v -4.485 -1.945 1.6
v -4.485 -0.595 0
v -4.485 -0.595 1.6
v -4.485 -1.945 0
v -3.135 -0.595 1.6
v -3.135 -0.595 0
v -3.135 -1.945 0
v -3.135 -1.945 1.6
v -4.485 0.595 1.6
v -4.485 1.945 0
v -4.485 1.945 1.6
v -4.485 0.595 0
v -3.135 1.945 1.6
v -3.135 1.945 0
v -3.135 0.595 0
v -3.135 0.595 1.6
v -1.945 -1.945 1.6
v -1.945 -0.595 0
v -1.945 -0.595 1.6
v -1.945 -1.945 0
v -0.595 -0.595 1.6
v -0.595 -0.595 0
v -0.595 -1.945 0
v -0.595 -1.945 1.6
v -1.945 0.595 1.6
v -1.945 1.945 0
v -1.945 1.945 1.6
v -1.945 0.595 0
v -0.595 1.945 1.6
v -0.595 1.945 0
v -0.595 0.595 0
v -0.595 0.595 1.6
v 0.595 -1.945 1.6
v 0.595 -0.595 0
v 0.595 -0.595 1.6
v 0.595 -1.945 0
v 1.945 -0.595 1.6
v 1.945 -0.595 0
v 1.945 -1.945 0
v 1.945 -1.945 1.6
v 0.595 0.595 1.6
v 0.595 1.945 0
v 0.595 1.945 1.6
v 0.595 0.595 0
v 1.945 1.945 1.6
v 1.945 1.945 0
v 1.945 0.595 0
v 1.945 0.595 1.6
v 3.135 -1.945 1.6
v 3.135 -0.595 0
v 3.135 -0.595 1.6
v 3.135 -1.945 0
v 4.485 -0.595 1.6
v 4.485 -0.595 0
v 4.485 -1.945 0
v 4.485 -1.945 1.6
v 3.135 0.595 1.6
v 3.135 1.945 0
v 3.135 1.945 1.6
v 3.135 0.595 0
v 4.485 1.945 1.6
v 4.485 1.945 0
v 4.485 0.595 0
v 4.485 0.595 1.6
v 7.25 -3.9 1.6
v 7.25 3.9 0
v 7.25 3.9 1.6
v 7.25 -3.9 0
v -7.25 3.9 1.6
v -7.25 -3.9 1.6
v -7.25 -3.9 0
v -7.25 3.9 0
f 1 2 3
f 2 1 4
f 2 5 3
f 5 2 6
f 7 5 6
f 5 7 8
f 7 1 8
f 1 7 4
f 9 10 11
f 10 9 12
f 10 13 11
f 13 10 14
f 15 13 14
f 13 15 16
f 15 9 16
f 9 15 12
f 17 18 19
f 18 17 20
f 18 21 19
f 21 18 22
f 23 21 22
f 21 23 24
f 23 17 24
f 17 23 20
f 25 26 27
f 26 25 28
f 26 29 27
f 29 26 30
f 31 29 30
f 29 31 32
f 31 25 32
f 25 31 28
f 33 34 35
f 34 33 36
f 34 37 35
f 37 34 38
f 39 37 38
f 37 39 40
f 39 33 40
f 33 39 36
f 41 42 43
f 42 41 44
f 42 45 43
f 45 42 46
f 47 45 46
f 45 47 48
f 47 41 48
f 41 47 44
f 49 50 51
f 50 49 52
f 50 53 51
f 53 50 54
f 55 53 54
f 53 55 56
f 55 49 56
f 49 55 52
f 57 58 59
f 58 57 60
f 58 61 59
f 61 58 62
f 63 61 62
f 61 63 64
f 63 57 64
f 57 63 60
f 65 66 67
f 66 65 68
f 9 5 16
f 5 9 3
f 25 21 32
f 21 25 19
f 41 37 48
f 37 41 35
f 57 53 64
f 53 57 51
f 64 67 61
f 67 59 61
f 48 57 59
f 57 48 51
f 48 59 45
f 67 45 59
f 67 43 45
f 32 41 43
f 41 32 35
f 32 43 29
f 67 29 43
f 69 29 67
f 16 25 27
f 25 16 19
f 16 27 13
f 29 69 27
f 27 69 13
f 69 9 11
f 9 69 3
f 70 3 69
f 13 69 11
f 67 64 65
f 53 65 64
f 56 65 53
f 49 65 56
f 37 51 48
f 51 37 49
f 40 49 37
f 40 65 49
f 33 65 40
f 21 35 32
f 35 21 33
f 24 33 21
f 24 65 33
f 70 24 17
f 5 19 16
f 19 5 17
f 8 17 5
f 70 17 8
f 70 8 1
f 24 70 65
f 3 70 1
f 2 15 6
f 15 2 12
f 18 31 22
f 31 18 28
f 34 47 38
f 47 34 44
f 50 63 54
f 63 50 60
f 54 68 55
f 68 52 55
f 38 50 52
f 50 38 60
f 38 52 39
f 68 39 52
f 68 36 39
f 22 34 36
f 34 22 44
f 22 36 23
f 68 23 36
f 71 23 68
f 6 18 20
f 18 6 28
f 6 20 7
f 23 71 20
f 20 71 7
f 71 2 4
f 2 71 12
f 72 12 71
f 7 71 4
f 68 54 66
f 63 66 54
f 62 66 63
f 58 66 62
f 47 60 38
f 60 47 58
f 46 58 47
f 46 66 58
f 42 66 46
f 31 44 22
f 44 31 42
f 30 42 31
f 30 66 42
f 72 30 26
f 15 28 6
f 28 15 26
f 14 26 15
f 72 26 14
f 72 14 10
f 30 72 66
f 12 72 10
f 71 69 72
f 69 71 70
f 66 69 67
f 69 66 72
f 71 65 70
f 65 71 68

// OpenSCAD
// BTS7960 / IBT-2 logic plug, v1 fit prototype (millimetres).
//
// v1: the complete driver-side nose is 1 mm narrower on each x side than v0,
// and fasteners are M3 bolts with external nuts. With an approximately 13 mm
// female-header body, the x-side walls are only about 0.55 mm: fit trial only.
// This is NOT keyed yet. Do not use with an energised motor.

$fn = 48;

part = "fit_gauge"; // [fit_gauge,lower,upper,assembly,exploded]

pitch = 2.54;
pin_hole = 1.35;         // confirmed by the first gauge fit on the driver
front_lip = 1.60;

header_x = 13.00;        // approximate complete 2x4 female-header body
header_y = 4.50;
header_z = 8.50;         // unmeasured; adjust after checking the female header
header_fit = 0.40;       // total clearance, not per side

nose_x = 14.50;          // v0 was 16.50: -1 mm at left and right, all along nose
nose_y = 7.80;
nose_z = front_lip + header_z + 1.00;

rear_x = 25.00;          // retained for adequate M3 flange wall thickness
rear_y = 15.00;
rear_z = 18.00;
rear_corner_r = 2.50;   // external x-z corners only; functional cuts unchanged
total_z = nose_z + rear_z;

solder_x = 12.00;        // smaller than v0, still wider than 7.62 mm pin span
solder_y = 9.20;
solder_depth = 13.00;
cable_exit_d = 5.50;

screw_x = 9.00;
screw_z = nose_z + 7.00;
screw_clearance_d = 3.20; // two M3 through-bolts, external nuts
mark_depth = 0.60;

epsilon = 0.02;

module eight_pin_pattern(h=1, aperture=pin_hole) {
    for (col = [0:3], row = [0:1])
        translate([(col - 1.5)*pitch, (row - 0.5)*pitch, -epsilon])
            linear_extrude(height=h + 2*epsilon)
                square([aperture, aperture], center=true);
}

module fit_gauge() {
    difference() {
        translate([-nose_x/2, -nose_y/2, 0])
            cube([nose_x, nose_y, front_lip]);
        eight_pin_pattern(front_lip);
    }
}

module outside_shell() {
    union() {
        translate([-nose_x/2, -nose_y/2, 0])
            cube([nose_x, nose_y, nose_z]);
        // Round the visible outline of the wide rear/upper housing. Cylinders
        // run along y, so screw axes, mating face and header cavity stay put.
        hull()
            for (x = [-rear_x/2 + rear_corner_r,
                       rear_x/2 - rear_corner_r],
                 z = [nose_z + rear_corner_r,
                      total_z - rear_corner_r])
                translate([x, 0, z])
                    rotate([-90, 0, 0])
                        cylinder(r=rear_corner_r, h=rear_y, center=true);
    }
}

module cable_bore() {
    translate([0, 0, nose_z + solder_depth - epsilon])
        cylinder(d=cable_exit_d, h=rear_z - solder_depth + 2*epsilon);
}

module fastener_holes() {
    for (x = [-screw_x, screw_x])
        translate([x, -rear_y/2 - epsilon, screw_z])
            rotate([-90, 0, 0])
                cylinder(d=screw_clearance_d, h=rear_y + 2*epsilon);
}

module orientation_mark() {
    // Recessed on the outside of the y-positive half. When wiring the plug,
    // this side must contain the VCC / R_IS / R_EN / RPWM socket row.
    translate([0, rear_y/2 + epsilon, nose_z + 3.10])
        rotate([90, 0, 0])
            linear_extrude(height=mark_depth + 2*epsilon)
                mirror([1, 0, 0])
                    text("VCC", size=3.80, halign="center", valign="center");
}

module whole_shell() {
    difference() {
        outside_shell();

        translate([-(header_x + header_fit)/2,
                   -(header_y + header_fit)/2,
                   front_lip])
            cube([header_x + header_fit,
                  header_y + header_fit,
                  header_z + 1.10]);

        // Insulated solder tails, five-wire harness and the EN bridge.
        translate([-solder_x/2, -solder_y/2, nose_z - epsilon])
            cube([solder_x, solder_y, solder_depth + 2*epsilon]);

        cable_bore();
        eight_pin_pattern(front_lip);
        fastener_holes();
        orientation_mark();
    }
}

module lower_half() {
    intersection() {
        whole_shell();
        translate([-rear_x, -rear_y, -epsilon])
            cube([2*rear_x, rear_y, total_z + 2*epsilon]);
    }
}

module upper_half() {
    intersection() {
        whole_shell();
        translate([-rear_x, 0, -epsilon])
            cube([2*rear_x, rear_y, total_z + 2*epsilon]);
    }
}

if (part == "fit_gauge") fit_gauge();
else if (part == "lower") rotate([-90, 0, 0]) lower_half();
else if (part == "upper") rotate([90, 0, 0]) upper_half();
else if (part == "assembly") {
    lower_half();
    color([0.40, 0.75, 0.85, 0.65]) upper_half();
} else if (part == "exploded") {
    color([0.40, 0.75, 0.85]) translate([0, 6, 0]) upper_half();
    color([0.45, 0.70, 0.45]) translate([0, -6, 0]) lower_half();
    %translate([-header_x/2, -header_y/2, front_lip])
        cube([header_x, header_y, header_z]);
} else assert(false, str("Unknown part: ", part));
